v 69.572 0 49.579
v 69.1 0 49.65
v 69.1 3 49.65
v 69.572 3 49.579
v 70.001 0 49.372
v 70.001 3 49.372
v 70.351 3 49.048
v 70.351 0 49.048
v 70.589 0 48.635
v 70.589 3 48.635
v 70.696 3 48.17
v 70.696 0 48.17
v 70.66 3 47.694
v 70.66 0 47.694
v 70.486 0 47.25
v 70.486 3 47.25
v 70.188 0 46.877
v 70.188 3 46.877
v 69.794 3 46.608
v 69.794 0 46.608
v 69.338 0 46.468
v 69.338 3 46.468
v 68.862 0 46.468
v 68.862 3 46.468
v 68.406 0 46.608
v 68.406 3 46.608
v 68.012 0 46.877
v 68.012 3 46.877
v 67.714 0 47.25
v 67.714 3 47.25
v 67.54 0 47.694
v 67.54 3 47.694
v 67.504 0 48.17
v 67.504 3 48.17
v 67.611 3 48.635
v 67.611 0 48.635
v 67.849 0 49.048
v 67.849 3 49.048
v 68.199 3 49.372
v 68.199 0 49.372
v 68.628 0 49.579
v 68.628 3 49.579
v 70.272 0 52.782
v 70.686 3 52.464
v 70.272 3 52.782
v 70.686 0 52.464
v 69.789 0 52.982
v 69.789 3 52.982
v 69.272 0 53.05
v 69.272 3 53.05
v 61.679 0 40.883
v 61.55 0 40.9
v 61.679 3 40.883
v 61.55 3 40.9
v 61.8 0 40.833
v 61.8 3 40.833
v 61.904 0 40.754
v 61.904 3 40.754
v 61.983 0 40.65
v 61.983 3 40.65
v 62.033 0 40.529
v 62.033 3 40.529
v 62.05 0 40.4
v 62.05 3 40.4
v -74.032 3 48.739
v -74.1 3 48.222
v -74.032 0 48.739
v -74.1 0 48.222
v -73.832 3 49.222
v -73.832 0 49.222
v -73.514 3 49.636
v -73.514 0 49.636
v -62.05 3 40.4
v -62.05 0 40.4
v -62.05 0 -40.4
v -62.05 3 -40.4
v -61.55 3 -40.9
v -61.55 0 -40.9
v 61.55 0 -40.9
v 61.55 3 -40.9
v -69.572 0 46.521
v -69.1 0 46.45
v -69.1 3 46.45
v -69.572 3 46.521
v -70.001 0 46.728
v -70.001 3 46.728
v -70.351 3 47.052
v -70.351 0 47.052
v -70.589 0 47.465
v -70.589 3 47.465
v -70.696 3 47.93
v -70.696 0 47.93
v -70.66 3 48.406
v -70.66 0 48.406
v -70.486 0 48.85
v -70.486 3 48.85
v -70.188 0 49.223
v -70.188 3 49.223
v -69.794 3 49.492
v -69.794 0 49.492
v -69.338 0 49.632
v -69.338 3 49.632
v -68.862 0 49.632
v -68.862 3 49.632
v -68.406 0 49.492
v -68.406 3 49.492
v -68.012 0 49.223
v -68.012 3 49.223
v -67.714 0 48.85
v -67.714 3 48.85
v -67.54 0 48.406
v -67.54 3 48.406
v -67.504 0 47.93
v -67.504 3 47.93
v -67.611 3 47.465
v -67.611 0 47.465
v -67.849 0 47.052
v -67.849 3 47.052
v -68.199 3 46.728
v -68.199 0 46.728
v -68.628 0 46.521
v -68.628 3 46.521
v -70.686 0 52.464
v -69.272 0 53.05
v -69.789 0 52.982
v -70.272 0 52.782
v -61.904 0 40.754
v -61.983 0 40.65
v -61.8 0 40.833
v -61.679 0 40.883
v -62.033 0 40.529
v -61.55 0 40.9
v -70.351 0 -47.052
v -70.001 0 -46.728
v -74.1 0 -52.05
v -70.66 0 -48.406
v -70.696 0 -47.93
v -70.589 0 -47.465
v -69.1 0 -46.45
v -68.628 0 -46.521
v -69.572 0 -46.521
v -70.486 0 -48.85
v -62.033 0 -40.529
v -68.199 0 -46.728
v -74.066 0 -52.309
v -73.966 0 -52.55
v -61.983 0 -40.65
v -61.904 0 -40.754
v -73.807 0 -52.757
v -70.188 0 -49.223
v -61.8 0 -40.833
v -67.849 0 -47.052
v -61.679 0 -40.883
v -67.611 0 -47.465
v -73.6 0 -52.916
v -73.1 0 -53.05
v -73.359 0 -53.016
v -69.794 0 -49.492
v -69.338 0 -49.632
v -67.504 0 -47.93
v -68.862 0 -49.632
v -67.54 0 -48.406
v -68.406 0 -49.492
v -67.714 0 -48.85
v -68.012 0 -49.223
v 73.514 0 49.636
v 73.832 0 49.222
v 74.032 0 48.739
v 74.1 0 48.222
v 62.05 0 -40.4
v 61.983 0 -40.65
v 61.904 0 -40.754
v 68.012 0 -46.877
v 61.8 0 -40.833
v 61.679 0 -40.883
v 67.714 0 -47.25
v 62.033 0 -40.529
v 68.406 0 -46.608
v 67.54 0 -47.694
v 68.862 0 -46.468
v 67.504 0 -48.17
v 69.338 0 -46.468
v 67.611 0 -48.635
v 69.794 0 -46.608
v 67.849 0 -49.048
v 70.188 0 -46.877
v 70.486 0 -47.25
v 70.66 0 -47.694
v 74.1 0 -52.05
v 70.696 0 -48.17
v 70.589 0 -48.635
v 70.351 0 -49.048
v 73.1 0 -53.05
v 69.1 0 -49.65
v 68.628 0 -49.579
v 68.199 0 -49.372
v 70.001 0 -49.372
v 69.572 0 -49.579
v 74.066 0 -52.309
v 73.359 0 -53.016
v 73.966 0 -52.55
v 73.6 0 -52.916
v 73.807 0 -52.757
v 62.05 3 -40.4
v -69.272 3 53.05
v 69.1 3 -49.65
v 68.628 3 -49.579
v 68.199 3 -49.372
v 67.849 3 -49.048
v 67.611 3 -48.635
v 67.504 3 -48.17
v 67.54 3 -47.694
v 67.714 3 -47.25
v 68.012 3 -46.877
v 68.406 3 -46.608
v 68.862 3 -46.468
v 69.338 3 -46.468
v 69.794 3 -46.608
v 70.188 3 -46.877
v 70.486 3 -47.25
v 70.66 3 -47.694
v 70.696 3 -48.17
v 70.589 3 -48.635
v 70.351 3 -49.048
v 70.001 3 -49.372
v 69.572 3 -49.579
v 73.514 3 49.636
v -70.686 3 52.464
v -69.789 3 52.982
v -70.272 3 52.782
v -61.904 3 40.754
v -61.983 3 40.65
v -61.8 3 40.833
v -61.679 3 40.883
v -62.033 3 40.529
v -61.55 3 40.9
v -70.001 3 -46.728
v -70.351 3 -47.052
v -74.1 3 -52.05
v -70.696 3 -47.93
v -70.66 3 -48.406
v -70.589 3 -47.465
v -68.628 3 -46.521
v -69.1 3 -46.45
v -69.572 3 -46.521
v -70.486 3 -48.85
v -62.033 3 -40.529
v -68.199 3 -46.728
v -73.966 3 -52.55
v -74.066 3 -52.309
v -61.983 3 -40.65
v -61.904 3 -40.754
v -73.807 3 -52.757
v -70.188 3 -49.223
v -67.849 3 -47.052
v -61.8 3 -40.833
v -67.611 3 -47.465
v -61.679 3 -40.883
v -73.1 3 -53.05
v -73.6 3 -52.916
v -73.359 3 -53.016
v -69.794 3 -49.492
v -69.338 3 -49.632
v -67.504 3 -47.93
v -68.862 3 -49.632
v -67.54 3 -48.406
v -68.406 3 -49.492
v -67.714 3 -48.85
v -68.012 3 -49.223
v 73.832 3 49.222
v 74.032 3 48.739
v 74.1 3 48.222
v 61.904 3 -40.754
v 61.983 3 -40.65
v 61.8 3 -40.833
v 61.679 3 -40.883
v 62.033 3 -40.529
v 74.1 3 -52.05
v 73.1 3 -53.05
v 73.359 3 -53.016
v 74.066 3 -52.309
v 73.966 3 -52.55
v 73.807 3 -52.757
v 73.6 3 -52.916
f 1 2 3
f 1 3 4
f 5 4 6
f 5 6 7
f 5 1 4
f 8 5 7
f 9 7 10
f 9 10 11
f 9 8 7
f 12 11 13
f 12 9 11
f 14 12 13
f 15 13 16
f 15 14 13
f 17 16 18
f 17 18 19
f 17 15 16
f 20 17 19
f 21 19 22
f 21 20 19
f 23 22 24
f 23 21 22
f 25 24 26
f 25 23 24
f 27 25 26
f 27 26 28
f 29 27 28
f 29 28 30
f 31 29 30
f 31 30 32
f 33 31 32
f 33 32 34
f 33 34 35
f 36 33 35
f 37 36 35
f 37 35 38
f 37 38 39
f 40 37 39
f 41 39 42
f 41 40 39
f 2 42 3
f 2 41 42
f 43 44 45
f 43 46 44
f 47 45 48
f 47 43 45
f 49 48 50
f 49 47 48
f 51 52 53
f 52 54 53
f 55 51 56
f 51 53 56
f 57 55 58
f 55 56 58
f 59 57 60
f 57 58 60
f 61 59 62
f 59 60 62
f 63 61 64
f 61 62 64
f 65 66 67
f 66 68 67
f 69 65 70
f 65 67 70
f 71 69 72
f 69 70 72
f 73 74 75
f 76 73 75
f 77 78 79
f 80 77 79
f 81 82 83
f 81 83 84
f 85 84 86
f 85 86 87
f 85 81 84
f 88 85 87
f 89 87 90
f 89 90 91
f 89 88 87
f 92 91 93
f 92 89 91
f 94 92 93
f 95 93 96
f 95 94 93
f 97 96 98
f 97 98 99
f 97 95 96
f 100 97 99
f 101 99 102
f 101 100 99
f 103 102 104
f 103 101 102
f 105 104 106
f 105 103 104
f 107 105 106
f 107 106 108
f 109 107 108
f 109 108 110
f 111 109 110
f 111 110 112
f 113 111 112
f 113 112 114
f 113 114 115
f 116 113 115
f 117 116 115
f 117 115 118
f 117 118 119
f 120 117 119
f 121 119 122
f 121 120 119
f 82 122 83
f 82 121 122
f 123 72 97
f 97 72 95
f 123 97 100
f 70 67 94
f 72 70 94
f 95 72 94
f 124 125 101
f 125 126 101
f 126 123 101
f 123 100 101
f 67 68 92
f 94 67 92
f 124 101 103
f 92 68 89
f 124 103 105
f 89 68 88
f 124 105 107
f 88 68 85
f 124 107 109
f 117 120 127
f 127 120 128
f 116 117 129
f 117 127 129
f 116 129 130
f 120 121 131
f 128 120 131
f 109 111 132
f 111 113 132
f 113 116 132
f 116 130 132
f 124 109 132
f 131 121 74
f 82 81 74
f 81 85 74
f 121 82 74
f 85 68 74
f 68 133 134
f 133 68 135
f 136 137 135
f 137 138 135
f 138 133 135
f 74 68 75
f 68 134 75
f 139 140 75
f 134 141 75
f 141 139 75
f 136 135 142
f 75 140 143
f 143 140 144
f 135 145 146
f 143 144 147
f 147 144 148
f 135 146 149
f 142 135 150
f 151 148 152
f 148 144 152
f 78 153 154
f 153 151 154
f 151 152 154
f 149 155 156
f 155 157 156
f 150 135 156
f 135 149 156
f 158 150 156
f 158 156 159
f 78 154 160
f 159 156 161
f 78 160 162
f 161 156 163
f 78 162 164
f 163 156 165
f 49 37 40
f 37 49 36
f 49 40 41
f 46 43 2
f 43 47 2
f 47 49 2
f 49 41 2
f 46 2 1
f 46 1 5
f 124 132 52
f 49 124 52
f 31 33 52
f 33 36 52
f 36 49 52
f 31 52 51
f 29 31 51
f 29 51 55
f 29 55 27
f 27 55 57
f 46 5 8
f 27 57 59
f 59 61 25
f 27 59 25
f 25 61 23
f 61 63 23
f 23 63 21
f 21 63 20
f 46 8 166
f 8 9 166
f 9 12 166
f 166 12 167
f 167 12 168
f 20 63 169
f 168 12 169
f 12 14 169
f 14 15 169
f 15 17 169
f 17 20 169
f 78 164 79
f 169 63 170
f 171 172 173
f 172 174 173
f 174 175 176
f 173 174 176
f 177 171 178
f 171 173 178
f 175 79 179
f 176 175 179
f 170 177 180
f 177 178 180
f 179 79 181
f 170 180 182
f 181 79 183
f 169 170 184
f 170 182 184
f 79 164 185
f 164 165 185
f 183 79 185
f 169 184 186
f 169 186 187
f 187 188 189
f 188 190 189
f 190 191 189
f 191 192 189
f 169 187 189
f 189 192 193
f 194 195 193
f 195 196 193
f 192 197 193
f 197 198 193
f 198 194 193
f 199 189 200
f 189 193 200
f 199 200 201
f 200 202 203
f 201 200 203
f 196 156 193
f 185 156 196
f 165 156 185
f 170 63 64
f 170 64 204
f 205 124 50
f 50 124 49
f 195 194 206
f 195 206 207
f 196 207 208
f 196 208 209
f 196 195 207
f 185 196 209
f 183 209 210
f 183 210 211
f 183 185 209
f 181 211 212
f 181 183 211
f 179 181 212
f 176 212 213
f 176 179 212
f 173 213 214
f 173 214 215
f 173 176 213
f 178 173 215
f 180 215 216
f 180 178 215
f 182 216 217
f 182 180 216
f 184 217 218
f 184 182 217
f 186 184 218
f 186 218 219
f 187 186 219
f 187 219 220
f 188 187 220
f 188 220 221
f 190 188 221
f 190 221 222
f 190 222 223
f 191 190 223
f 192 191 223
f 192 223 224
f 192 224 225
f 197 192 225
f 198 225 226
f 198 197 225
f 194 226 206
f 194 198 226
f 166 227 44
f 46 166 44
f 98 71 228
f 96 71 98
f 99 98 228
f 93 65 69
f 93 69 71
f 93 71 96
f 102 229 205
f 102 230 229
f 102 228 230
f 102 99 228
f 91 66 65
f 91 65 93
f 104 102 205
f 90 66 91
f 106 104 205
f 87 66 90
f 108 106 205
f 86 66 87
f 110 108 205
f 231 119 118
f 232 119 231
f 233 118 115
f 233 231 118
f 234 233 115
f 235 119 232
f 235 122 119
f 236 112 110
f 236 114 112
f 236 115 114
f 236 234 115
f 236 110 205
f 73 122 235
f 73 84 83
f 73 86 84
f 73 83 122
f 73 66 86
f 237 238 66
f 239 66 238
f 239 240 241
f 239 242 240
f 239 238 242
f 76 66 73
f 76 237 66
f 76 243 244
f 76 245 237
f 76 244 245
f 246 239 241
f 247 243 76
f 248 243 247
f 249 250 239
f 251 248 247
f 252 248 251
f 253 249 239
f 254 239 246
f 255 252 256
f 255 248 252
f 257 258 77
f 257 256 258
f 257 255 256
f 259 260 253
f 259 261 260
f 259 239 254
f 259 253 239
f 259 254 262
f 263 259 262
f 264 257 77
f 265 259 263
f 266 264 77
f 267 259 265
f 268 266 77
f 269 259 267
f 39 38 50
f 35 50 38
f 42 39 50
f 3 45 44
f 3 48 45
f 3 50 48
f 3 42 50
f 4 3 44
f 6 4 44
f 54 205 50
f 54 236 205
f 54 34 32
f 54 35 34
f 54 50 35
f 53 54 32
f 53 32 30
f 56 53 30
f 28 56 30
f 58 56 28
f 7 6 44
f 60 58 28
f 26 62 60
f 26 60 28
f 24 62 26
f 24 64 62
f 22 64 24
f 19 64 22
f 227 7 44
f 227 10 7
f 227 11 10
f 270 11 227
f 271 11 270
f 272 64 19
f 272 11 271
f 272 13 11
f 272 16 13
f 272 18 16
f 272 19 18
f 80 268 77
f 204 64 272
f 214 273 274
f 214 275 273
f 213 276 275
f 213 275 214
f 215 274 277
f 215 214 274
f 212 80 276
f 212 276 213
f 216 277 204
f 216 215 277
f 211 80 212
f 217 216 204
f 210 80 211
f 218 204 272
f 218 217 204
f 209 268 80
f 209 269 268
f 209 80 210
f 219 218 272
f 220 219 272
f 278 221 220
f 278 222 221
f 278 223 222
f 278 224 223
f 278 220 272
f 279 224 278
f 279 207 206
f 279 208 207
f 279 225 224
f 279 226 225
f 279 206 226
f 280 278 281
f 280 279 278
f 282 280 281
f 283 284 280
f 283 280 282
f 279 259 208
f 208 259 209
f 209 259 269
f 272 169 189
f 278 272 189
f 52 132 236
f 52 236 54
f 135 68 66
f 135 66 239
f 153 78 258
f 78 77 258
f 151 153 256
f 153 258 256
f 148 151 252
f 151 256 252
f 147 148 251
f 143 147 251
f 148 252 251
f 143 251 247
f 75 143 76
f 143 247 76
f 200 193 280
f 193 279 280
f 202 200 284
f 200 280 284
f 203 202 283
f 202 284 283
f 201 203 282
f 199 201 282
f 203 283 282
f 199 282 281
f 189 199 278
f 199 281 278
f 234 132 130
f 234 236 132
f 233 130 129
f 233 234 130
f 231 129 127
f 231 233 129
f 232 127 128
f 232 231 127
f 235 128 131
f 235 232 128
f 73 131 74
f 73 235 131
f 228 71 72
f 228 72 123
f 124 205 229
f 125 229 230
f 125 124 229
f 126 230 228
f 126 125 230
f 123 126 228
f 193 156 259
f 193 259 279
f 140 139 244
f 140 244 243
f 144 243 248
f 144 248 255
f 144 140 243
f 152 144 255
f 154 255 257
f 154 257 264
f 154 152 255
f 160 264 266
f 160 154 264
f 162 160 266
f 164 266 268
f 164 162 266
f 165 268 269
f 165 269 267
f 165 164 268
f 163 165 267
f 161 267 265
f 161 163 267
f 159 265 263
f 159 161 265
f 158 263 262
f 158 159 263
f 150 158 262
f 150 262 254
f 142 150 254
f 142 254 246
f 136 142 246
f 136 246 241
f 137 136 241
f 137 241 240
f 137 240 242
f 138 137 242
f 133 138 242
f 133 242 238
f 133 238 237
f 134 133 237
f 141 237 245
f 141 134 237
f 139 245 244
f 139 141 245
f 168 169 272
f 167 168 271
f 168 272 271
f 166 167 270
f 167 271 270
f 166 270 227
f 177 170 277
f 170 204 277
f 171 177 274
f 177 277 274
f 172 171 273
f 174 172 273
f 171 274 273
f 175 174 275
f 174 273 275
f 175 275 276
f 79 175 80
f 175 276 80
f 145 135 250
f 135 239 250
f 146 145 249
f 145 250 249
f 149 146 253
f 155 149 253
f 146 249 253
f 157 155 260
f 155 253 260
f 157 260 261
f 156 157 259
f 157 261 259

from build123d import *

# Parameters (mm, degrees)
SKETCH1_W           = 148.2
SKETCH1_H           = 106.1
SKETCH1_R           = 1.6
SKETCH1_W_2         = 124.1
SKETCH1_H_2         = 81.8
BOSS_EXTRUDE1_DEPTH = 3
FILLET1_R           = 1
FILLET2_R           = 0.5
CUT_EXTRUDE1_REACH  = 93.182
FILLET3_R           = 2


with BuildPart() as part:
    # Sketch1 → Boss-Extrude1 (new body)
    with BuildSketch(Plane(origin=(0, 0, 0), x_dir=(1, 0, 0), z_dir=(0, 1, 0))):
        Rectangle(SKETCH1_W, SKETCH1_H)
        with Locations(Location((-69.1, 48.05, 0), (0, 0, 270))):
            Circle(SKETCH1_R, mode=Mode.SUBTRACT)
        with Locations(Location((-69.1, -48.05, 0), (0, 0, 90))):
            Circle(SKETCH1_R, mode=Mode.SUBTRACT)
        with Locations(Location((69.1, -48.05, 0), (0, 0, 270))):
            Circle(SKETCH1_R, mode=Mode.SUBTRACT)
        with Locations(Location((69.1, 48.05, 0), (0, 0, 90))):
            Circle(SKETCH1_R, mode=Mode.SUBTRACT)
        Rectangle(SKETCH1_W_2, SKETCH1_H_2, mode=Mode.SUBTRACT)
    extrude(amount=BOSS_EXTRUDE1_DEPTH)

    # Fillet1
    fillet1_edges = [part.edges().sort_by_distance(p)[0] for p in [
        (-74.1, 1.5, -53.05),
        (74.1, 1.5, -53.05),
        (74.1, 1.5, 53.05),
        (-74.1, 1.5, 53.05),
    ]]
    fillet(fillet1_edges, radius=FILLET1_R)

    # Fillet2
    fillet2_edges = [part.edges().sort_by_distance(p)[0] for p in [
        (62.05, 1.5, 40.9),
        (62.05, 1.5, -40.9),
        (-62.05, 1.5, -40.9),
        (-62.05, 1.5, 40.9),
    ]]
    fillet(fillet2_edges, radius=FILLET2_R)

    # Sketch2 → Cut-Extrude1 (cut, up to next)
    with BuildSketch(Plane(origin=(0, 3, 0), x_dir=(-1, 0, 0), z_dir=(0, 1, 0)), mode=Mode.PRIVATE) as cut_extrude1_sk1:
        Polygon((77.1, 46.05), (67.1, 56.05), (77.1, 56.05), align=None)
    cut_extrude1_tool1 = extrude(cut_extrude1_sk1.sketch, amount=-CUT_EXTRUDE1_REACH, mode=Mode.PRIVATE) & part.part
    # Sketch2 → Cut-Extrude1 (cut, up to next)
    with BuildSketch(Plane(origin=(0, 3, 0), x_dir=(-1, 0, 0), z_dir=(0, 1, 0)), mode=Mode.PRIVATE) as cut_extrude1_sk2:
        Polygon((-77.1, 56.05), (-77.1, 46.05), (-67.1, 56.05), align=None)
    cut_extrude1_tool2 = extrude(cut_extrude1_sk2.sketch, amount=-CUT_EXTRUDE1_REACH, mode=Mode.PRIVATE) & part.part
    add(cut_extrude1_tool1.solids().sort_by_distance((-73.766667, 3, 52.716667))[0], mode=Mode.SUBTRACT)
    add(cut_extrude1_tool2.solids().sort_by_distance((73.766667, 3, 52.716667))[0], mode=Mode.SUBTRACT)

    # Fillet3
    fillet3_edges = [part.edges().sort_by_distance(p)[0] for p in [
        (70.1, 1.5, 53.05),
        (74.1, 1.5, 49.05),
        (-74.1, 1.5, 49.05),
        (-70.1, 1.5, 53.05),
    ]]
    fillet(fillet3_edges, radius=FILLET3_R)


solid = part.part
